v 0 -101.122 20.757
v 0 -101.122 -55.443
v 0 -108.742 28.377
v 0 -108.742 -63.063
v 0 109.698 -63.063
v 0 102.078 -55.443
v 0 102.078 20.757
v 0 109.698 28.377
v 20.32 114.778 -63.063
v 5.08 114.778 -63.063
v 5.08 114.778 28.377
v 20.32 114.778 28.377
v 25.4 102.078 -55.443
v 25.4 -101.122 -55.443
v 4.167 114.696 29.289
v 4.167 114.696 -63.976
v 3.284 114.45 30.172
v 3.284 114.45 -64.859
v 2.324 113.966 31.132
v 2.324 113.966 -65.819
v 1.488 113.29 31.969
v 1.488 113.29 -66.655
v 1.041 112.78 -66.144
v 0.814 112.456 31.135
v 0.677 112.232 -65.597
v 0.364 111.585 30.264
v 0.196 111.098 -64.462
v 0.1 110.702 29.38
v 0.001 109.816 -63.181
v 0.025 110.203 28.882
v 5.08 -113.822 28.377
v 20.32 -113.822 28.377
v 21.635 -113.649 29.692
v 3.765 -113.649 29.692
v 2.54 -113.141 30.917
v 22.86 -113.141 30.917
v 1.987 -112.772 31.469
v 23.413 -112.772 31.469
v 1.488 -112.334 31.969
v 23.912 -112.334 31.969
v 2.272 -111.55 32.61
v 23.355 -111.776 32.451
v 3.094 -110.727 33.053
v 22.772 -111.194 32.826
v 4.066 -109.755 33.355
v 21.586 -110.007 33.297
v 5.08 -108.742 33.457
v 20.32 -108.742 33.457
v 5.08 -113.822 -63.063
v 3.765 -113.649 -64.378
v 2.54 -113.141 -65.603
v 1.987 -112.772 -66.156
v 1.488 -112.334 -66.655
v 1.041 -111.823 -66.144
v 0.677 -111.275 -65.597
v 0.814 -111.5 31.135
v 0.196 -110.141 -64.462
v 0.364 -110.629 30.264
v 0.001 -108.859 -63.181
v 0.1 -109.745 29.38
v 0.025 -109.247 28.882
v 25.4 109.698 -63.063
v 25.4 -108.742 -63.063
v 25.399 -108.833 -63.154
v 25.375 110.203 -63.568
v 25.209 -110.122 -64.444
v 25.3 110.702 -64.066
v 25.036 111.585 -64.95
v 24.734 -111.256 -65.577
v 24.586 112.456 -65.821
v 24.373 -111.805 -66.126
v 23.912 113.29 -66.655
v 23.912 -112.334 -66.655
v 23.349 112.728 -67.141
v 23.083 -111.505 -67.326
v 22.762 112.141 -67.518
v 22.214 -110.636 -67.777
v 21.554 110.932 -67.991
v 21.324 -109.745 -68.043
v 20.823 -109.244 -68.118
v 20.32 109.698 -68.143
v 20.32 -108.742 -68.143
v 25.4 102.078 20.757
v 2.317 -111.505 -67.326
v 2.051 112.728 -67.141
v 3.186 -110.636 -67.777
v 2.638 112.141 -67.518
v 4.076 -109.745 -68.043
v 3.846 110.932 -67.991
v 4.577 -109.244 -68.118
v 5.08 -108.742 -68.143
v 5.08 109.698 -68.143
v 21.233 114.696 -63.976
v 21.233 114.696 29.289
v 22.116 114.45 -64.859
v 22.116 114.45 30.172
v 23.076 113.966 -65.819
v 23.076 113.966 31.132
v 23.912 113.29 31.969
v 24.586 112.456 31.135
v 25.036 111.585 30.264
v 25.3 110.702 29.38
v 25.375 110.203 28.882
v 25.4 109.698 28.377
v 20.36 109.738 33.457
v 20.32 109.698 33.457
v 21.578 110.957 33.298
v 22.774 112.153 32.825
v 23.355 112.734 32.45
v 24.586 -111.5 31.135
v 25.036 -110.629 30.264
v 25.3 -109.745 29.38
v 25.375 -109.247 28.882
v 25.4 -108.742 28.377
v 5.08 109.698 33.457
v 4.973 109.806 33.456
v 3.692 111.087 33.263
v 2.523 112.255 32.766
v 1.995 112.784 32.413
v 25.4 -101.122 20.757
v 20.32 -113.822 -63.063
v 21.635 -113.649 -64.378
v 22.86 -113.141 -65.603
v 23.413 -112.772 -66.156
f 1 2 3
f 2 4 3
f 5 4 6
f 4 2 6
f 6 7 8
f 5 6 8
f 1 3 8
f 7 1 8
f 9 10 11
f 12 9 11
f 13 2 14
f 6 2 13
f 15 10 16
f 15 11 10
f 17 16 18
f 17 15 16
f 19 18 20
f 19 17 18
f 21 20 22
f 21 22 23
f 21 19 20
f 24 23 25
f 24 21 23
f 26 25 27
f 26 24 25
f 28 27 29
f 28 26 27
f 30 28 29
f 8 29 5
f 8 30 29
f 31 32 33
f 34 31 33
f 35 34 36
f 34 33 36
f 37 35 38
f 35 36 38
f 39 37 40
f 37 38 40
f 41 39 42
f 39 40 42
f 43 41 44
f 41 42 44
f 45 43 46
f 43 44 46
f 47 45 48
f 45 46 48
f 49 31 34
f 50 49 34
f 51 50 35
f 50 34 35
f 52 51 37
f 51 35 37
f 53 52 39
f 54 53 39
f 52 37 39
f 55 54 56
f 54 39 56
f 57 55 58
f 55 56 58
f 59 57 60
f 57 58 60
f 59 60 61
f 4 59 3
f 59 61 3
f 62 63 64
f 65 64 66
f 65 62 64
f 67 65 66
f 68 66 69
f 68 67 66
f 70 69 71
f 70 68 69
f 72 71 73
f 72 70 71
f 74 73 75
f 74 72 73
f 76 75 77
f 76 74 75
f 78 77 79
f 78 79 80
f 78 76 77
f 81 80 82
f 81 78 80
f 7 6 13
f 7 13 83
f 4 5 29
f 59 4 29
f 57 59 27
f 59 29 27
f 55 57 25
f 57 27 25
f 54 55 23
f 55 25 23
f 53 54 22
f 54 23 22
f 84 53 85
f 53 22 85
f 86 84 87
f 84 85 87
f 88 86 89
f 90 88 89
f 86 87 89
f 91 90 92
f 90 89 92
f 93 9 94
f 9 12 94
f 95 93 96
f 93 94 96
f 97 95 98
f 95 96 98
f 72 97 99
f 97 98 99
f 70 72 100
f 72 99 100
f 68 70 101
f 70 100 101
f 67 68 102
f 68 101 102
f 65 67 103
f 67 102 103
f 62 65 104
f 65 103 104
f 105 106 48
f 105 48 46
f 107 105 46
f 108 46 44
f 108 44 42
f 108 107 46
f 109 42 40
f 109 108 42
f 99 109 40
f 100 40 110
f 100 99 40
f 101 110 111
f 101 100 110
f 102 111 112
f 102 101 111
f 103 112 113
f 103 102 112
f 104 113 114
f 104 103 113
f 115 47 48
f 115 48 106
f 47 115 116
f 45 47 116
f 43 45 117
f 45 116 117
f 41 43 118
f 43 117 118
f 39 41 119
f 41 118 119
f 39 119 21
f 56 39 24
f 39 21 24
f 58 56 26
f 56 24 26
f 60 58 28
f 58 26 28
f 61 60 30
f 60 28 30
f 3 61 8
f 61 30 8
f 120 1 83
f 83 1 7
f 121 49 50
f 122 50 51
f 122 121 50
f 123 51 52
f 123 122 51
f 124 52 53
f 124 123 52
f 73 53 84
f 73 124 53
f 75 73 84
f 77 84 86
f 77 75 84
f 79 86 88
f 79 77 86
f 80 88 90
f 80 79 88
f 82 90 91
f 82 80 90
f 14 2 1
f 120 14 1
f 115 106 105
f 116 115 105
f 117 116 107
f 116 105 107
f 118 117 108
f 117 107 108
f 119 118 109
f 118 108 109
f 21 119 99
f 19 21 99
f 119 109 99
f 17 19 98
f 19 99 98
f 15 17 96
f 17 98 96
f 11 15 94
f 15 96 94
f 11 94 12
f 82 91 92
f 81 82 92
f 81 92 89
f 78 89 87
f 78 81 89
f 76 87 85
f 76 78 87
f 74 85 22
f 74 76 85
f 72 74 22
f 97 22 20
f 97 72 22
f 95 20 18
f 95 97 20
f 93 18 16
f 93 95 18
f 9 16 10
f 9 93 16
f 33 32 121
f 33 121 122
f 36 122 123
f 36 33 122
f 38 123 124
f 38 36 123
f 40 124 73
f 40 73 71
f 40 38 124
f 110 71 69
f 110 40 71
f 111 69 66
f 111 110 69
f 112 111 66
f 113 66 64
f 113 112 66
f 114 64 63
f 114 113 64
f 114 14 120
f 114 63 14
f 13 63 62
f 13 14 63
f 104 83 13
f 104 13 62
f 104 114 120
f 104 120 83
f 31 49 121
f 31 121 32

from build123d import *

# Parameters (mm, degrees)
F0_W        = 228.6
F0_H        = 101.6
F0_W_2      = 203.2
F0_H_2      = 76.2
F1_DEPTH    = 25.4
F2_R        = 5.08
F3_T1_DEPTH = 243.84
F4_T1_DEPTH = 243.84


# Not quite as in the source:
# - a fillet or chamfer that OpenCascade refuses, or shapes differently, is made with other operations: its cross-section is extruded or revolved along the edge and cut away or added


with BuildPart() as f1:
    # F0 (on Right) → F1 (new body)
    with BuildSketch(Plane.YZ):
        with Locations((0.4783831537, -17.3432382704)):
            Rectangle(F0_W, F0_H)
        with Locations((0.4783831537, -17.3432382704)):
            Rectangle(F0_W_2, F0_H_2, mode=Mode.SUBTRACT)
    extrude(amount=F1_DEPTH)

    # F2
    f2_edges = [f1.edges().sort_by_distance(p)[0] for p in [
        (12.7, -113.821617, 33.456762),
        (12.7, -113.821617, -68.143238),
        (0, -113.821617, -17.343238),
        (25.4, -113.821617, -17.343238),
        (12.7, 114.778383, -68.143238),
        (12.7, 114.778383, 33.456762),
        (0, 114.778383, -17.343238),
        (25.4, 114.778383, -17.343238),
    ]]
    fillet(f2_edges, radius=F2_R)

    # F3: fillet of radius 5.08 on 4 edges, made by hand

    # F3_s2 → F3_t1 (cut)
    with BuildSketch(Plane.XZ.offset(-122.3983831537)):
        with BuildLine():
            ThreePointArc((0, -63.0632382704), (1.4878975516, -66.6553407189), (5.08, -68.1432382704))
            Line((5.08, -68.1432382704), (0, -68.1432382704))
            Line((0, -68.1432382704), (0, -63.0632382704))
        make_face()
        with BuildLine():
            ThreePointArc((25.4, -63.0632382704), (23.9121024484, -66.6553407189), (20.32, -68.1432382704))
            Line((20.32, -68.1432382704), (25.4, -68.1432382704))
            Line((25.4, -68.1432382704), (25.4, -63.0632382704))
        make_face()
    extrude(amount=F3_T1_DEPTH, mode=Mode.SUBTRACT)

    # F4: fillet of radius 5.08 on 4 edges, made by hand

    # F4_s2 → F4_t1 (cut)
    with BuildSketch(Plane.XZ.offset(-122.3983831537)):
        with BuildLine():
            ThreePointArc((5.08, 33.4567617296), (1.4878975516, 31.968864178), (0, 28.3767617296))
            Line((0, 28.3767617296), (0, 33.4567617296))
            Line((0, 33.4567617296), (5.08, 33.4567617296))
        make_face()
        with BuildLine():
            ThreePointArc((20.32, 33.4567617296), (23.9121024484, 31.968864178), (25.4, 28.3767617296))
            Line((25.4, 28.3767617296), (25.4, 33.4567617296))
            Line((25.4, 33.4567617296), (20.32, 33.4567617296))
        make_face()
    extrude(amount=F4_T1_DEPTH, mode=Mode.SUBTRACT)


solid = f1.part
